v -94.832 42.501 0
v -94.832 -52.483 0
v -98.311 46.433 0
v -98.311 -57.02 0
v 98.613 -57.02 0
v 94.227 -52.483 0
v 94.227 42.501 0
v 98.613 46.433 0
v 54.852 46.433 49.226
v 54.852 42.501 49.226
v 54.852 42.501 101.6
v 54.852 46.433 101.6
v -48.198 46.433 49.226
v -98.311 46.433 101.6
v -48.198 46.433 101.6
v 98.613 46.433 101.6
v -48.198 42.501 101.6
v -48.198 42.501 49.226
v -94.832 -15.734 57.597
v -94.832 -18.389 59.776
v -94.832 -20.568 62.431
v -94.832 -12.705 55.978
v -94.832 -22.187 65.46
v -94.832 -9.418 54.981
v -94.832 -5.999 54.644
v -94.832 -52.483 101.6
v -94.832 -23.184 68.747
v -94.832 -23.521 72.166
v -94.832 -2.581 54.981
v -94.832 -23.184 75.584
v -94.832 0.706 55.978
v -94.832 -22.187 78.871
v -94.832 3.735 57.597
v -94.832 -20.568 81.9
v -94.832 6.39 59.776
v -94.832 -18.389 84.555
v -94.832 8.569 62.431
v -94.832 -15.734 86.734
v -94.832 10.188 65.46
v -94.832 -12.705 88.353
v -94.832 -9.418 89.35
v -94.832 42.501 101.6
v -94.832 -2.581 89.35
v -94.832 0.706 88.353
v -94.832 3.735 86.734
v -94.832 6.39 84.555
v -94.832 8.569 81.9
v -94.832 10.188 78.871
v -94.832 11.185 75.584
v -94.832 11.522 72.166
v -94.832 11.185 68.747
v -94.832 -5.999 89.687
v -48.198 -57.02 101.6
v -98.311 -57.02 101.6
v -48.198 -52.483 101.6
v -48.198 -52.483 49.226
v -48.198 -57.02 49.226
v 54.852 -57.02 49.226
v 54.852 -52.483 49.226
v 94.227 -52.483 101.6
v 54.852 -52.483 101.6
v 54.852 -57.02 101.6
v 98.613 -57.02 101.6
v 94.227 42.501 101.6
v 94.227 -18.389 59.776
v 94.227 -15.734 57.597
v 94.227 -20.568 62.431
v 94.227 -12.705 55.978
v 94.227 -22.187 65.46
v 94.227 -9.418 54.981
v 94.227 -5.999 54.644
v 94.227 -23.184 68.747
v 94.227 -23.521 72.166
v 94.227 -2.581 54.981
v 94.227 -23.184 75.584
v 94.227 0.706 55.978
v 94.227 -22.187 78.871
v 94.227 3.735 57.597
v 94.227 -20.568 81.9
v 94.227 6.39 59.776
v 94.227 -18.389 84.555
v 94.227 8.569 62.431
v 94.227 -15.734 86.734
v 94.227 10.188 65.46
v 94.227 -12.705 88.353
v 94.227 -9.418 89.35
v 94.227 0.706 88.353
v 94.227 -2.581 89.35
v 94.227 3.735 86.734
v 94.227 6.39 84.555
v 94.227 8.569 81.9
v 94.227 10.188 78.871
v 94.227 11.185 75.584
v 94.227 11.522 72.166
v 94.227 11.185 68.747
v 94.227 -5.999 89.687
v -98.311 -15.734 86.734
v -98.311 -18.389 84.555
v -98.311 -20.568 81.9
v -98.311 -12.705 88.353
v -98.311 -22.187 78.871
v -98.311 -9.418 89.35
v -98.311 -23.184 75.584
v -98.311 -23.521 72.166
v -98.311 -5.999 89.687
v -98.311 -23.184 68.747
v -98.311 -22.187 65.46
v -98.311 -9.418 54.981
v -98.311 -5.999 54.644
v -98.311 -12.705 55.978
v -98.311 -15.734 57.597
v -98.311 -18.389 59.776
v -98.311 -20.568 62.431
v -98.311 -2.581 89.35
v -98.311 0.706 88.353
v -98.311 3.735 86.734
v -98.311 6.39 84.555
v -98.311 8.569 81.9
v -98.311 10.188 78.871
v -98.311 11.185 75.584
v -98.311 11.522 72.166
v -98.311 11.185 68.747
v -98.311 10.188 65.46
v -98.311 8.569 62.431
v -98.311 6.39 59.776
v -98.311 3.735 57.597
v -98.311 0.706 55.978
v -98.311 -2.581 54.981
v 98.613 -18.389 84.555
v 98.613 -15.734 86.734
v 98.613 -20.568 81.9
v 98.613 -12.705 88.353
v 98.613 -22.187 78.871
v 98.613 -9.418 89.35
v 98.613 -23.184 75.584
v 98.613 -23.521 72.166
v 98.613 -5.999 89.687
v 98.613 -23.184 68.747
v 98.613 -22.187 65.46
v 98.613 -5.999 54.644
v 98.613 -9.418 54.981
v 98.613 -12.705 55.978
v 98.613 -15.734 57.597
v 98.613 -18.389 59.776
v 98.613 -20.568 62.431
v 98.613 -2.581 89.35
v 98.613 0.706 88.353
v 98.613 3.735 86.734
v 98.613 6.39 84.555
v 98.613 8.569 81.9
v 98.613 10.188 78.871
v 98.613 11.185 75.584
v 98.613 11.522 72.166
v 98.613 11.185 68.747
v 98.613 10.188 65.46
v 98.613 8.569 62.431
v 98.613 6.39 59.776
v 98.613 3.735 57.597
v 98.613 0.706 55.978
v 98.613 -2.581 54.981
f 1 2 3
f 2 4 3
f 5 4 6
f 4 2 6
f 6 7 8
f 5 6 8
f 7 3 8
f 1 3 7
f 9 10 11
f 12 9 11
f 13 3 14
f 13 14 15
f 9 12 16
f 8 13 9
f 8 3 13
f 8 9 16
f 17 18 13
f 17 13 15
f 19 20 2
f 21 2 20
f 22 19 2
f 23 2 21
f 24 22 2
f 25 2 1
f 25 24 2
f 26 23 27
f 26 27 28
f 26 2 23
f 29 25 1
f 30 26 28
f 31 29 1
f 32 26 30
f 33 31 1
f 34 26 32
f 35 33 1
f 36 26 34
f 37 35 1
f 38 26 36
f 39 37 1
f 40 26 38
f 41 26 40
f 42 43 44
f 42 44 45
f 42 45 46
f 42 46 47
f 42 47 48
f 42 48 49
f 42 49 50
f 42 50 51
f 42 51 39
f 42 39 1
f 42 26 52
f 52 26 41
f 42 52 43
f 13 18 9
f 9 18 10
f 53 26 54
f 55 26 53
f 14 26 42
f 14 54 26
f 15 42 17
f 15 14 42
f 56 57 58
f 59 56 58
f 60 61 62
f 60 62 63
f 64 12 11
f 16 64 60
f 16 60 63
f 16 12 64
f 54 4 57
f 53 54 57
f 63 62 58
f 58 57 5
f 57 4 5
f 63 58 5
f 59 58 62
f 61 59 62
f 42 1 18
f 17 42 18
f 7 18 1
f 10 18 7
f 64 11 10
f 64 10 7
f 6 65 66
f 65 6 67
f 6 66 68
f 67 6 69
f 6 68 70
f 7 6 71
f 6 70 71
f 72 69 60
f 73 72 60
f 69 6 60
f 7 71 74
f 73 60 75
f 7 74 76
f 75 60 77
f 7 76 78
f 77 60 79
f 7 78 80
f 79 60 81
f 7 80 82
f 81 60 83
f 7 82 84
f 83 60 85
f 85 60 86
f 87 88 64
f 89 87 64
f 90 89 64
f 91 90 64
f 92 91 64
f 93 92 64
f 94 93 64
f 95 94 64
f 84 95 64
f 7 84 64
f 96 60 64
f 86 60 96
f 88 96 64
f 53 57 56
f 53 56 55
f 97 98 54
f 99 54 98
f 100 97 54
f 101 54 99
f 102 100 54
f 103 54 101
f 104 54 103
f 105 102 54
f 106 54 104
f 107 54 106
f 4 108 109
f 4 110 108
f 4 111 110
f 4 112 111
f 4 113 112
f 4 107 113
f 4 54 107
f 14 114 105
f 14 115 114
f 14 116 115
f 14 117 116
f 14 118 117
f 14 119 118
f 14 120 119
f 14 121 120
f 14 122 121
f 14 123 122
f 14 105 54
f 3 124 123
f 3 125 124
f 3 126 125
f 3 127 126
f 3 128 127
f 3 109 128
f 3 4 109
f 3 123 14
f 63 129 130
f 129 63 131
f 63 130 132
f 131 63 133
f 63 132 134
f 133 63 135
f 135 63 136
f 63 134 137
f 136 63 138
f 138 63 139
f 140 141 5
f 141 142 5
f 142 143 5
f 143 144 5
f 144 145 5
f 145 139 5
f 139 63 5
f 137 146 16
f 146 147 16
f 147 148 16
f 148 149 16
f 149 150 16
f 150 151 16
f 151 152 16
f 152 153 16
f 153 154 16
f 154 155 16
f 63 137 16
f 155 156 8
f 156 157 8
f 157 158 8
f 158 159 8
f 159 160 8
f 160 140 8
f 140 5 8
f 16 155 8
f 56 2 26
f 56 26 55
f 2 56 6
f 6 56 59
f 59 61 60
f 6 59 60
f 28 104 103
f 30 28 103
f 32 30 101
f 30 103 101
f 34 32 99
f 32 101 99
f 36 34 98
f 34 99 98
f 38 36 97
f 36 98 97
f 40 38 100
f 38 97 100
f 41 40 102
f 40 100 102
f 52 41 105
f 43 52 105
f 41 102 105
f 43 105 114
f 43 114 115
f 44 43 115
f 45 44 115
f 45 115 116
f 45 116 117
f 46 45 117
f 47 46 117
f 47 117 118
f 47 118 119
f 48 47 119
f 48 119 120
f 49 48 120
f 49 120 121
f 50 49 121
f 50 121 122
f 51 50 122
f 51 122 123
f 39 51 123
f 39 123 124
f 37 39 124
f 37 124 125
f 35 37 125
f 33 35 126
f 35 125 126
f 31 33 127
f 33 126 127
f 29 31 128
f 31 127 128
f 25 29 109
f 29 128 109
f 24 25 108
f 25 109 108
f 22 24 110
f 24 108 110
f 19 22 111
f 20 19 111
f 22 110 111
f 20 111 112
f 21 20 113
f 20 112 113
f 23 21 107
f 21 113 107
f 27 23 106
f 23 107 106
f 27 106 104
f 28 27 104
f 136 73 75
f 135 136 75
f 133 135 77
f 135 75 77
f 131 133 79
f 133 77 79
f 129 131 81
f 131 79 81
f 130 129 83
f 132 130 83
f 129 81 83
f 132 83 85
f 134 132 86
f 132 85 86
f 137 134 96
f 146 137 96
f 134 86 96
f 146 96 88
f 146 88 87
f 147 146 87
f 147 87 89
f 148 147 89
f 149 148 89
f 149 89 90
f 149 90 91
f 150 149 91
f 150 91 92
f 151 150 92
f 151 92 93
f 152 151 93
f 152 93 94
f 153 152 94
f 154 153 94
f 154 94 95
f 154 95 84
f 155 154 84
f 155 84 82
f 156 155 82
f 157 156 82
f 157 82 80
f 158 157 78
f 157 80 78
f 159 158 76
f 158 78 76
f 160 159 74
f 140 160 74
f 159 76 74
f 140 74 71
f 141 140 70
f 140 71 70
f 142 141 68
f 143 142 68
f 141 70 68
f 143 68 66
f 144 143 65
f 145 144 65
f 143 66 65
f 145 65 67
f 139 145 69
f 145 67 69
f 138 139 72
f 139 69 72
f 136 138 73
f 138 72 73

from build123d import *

# Parameters (mm, degrees)
F0_W     = 196.9244256616
F0_H     = 103.4533828497
F1_DEPTH = 101.6
F2_W     = 103.0500568449
F2_H     = 91.7569026351
F3_DEPTH = 103.4543828497
F4_R     = 17.5216087131
F5_DEPTH = 196.9254256616
F6_W     = 189.05954808
F6_H     = 94.9835181236
F7_DEPTH = 52.3746936212
F8_W     = 189.05954808
F8_H     = 94.9835181236
F9_DEPTH = 49.2273063788


with BuildPart() as f1:
    # F0 (on Top) → F1 (new body)
    with BuildSketch(Plane.XY):
        with Locations((0.1512430608, -5.2936673164)):
            Rectangle(F0_W, F0_H)
    extrude(amount=F1_DEPTH)

    # F2 (on face) → F3 (cut, through all)
    with BuildSketch(Plane.XZ.offset(57.0203587413)):
        with Locations((3.3274423331, 95.1047576964)):
            Rectangle(F2_W, F2_H)
    extrude(amount=-F3_DEPTH, mode=Mode.SUBTRACT)

    # F4 (on face) → F5 (cut, through all)
    with BuildSketch(Plane(origin=(-98.31096977, 0, 0), x_dir=(0, -1, 0), z_dir=(-1, 0, 0))):
        with Locations((5.9994906187, 72.1655264497)):
            Circle(F4_R)
    extrude(amount=-F5_DEPTH, mode=Mode.SUBTRACT)

    # F6 (on face) → F7 (cut, through all)
    with BuildSketch(Plane.XY.offset(49.2263063788)):
        with Locations((-0.3025047481, -4.9911737442)):
            Rectangle(F6_W, F6_H)
    extrude(amount=F7_DEPTH, mode=Mode.SUBTRACT)

    # F8 (on face) → F9 (cut, through all)
    with BuildSketch(Plane.XY.offset(49.2263063788)):
        with Locations((-0.3025047481, -4.9911737442)):
            Rectangle(F8_W, F8_H)
    extrude(amount=-F9_DEPTH, mode=Mode.SUBTRACT)


solid = f1.part
